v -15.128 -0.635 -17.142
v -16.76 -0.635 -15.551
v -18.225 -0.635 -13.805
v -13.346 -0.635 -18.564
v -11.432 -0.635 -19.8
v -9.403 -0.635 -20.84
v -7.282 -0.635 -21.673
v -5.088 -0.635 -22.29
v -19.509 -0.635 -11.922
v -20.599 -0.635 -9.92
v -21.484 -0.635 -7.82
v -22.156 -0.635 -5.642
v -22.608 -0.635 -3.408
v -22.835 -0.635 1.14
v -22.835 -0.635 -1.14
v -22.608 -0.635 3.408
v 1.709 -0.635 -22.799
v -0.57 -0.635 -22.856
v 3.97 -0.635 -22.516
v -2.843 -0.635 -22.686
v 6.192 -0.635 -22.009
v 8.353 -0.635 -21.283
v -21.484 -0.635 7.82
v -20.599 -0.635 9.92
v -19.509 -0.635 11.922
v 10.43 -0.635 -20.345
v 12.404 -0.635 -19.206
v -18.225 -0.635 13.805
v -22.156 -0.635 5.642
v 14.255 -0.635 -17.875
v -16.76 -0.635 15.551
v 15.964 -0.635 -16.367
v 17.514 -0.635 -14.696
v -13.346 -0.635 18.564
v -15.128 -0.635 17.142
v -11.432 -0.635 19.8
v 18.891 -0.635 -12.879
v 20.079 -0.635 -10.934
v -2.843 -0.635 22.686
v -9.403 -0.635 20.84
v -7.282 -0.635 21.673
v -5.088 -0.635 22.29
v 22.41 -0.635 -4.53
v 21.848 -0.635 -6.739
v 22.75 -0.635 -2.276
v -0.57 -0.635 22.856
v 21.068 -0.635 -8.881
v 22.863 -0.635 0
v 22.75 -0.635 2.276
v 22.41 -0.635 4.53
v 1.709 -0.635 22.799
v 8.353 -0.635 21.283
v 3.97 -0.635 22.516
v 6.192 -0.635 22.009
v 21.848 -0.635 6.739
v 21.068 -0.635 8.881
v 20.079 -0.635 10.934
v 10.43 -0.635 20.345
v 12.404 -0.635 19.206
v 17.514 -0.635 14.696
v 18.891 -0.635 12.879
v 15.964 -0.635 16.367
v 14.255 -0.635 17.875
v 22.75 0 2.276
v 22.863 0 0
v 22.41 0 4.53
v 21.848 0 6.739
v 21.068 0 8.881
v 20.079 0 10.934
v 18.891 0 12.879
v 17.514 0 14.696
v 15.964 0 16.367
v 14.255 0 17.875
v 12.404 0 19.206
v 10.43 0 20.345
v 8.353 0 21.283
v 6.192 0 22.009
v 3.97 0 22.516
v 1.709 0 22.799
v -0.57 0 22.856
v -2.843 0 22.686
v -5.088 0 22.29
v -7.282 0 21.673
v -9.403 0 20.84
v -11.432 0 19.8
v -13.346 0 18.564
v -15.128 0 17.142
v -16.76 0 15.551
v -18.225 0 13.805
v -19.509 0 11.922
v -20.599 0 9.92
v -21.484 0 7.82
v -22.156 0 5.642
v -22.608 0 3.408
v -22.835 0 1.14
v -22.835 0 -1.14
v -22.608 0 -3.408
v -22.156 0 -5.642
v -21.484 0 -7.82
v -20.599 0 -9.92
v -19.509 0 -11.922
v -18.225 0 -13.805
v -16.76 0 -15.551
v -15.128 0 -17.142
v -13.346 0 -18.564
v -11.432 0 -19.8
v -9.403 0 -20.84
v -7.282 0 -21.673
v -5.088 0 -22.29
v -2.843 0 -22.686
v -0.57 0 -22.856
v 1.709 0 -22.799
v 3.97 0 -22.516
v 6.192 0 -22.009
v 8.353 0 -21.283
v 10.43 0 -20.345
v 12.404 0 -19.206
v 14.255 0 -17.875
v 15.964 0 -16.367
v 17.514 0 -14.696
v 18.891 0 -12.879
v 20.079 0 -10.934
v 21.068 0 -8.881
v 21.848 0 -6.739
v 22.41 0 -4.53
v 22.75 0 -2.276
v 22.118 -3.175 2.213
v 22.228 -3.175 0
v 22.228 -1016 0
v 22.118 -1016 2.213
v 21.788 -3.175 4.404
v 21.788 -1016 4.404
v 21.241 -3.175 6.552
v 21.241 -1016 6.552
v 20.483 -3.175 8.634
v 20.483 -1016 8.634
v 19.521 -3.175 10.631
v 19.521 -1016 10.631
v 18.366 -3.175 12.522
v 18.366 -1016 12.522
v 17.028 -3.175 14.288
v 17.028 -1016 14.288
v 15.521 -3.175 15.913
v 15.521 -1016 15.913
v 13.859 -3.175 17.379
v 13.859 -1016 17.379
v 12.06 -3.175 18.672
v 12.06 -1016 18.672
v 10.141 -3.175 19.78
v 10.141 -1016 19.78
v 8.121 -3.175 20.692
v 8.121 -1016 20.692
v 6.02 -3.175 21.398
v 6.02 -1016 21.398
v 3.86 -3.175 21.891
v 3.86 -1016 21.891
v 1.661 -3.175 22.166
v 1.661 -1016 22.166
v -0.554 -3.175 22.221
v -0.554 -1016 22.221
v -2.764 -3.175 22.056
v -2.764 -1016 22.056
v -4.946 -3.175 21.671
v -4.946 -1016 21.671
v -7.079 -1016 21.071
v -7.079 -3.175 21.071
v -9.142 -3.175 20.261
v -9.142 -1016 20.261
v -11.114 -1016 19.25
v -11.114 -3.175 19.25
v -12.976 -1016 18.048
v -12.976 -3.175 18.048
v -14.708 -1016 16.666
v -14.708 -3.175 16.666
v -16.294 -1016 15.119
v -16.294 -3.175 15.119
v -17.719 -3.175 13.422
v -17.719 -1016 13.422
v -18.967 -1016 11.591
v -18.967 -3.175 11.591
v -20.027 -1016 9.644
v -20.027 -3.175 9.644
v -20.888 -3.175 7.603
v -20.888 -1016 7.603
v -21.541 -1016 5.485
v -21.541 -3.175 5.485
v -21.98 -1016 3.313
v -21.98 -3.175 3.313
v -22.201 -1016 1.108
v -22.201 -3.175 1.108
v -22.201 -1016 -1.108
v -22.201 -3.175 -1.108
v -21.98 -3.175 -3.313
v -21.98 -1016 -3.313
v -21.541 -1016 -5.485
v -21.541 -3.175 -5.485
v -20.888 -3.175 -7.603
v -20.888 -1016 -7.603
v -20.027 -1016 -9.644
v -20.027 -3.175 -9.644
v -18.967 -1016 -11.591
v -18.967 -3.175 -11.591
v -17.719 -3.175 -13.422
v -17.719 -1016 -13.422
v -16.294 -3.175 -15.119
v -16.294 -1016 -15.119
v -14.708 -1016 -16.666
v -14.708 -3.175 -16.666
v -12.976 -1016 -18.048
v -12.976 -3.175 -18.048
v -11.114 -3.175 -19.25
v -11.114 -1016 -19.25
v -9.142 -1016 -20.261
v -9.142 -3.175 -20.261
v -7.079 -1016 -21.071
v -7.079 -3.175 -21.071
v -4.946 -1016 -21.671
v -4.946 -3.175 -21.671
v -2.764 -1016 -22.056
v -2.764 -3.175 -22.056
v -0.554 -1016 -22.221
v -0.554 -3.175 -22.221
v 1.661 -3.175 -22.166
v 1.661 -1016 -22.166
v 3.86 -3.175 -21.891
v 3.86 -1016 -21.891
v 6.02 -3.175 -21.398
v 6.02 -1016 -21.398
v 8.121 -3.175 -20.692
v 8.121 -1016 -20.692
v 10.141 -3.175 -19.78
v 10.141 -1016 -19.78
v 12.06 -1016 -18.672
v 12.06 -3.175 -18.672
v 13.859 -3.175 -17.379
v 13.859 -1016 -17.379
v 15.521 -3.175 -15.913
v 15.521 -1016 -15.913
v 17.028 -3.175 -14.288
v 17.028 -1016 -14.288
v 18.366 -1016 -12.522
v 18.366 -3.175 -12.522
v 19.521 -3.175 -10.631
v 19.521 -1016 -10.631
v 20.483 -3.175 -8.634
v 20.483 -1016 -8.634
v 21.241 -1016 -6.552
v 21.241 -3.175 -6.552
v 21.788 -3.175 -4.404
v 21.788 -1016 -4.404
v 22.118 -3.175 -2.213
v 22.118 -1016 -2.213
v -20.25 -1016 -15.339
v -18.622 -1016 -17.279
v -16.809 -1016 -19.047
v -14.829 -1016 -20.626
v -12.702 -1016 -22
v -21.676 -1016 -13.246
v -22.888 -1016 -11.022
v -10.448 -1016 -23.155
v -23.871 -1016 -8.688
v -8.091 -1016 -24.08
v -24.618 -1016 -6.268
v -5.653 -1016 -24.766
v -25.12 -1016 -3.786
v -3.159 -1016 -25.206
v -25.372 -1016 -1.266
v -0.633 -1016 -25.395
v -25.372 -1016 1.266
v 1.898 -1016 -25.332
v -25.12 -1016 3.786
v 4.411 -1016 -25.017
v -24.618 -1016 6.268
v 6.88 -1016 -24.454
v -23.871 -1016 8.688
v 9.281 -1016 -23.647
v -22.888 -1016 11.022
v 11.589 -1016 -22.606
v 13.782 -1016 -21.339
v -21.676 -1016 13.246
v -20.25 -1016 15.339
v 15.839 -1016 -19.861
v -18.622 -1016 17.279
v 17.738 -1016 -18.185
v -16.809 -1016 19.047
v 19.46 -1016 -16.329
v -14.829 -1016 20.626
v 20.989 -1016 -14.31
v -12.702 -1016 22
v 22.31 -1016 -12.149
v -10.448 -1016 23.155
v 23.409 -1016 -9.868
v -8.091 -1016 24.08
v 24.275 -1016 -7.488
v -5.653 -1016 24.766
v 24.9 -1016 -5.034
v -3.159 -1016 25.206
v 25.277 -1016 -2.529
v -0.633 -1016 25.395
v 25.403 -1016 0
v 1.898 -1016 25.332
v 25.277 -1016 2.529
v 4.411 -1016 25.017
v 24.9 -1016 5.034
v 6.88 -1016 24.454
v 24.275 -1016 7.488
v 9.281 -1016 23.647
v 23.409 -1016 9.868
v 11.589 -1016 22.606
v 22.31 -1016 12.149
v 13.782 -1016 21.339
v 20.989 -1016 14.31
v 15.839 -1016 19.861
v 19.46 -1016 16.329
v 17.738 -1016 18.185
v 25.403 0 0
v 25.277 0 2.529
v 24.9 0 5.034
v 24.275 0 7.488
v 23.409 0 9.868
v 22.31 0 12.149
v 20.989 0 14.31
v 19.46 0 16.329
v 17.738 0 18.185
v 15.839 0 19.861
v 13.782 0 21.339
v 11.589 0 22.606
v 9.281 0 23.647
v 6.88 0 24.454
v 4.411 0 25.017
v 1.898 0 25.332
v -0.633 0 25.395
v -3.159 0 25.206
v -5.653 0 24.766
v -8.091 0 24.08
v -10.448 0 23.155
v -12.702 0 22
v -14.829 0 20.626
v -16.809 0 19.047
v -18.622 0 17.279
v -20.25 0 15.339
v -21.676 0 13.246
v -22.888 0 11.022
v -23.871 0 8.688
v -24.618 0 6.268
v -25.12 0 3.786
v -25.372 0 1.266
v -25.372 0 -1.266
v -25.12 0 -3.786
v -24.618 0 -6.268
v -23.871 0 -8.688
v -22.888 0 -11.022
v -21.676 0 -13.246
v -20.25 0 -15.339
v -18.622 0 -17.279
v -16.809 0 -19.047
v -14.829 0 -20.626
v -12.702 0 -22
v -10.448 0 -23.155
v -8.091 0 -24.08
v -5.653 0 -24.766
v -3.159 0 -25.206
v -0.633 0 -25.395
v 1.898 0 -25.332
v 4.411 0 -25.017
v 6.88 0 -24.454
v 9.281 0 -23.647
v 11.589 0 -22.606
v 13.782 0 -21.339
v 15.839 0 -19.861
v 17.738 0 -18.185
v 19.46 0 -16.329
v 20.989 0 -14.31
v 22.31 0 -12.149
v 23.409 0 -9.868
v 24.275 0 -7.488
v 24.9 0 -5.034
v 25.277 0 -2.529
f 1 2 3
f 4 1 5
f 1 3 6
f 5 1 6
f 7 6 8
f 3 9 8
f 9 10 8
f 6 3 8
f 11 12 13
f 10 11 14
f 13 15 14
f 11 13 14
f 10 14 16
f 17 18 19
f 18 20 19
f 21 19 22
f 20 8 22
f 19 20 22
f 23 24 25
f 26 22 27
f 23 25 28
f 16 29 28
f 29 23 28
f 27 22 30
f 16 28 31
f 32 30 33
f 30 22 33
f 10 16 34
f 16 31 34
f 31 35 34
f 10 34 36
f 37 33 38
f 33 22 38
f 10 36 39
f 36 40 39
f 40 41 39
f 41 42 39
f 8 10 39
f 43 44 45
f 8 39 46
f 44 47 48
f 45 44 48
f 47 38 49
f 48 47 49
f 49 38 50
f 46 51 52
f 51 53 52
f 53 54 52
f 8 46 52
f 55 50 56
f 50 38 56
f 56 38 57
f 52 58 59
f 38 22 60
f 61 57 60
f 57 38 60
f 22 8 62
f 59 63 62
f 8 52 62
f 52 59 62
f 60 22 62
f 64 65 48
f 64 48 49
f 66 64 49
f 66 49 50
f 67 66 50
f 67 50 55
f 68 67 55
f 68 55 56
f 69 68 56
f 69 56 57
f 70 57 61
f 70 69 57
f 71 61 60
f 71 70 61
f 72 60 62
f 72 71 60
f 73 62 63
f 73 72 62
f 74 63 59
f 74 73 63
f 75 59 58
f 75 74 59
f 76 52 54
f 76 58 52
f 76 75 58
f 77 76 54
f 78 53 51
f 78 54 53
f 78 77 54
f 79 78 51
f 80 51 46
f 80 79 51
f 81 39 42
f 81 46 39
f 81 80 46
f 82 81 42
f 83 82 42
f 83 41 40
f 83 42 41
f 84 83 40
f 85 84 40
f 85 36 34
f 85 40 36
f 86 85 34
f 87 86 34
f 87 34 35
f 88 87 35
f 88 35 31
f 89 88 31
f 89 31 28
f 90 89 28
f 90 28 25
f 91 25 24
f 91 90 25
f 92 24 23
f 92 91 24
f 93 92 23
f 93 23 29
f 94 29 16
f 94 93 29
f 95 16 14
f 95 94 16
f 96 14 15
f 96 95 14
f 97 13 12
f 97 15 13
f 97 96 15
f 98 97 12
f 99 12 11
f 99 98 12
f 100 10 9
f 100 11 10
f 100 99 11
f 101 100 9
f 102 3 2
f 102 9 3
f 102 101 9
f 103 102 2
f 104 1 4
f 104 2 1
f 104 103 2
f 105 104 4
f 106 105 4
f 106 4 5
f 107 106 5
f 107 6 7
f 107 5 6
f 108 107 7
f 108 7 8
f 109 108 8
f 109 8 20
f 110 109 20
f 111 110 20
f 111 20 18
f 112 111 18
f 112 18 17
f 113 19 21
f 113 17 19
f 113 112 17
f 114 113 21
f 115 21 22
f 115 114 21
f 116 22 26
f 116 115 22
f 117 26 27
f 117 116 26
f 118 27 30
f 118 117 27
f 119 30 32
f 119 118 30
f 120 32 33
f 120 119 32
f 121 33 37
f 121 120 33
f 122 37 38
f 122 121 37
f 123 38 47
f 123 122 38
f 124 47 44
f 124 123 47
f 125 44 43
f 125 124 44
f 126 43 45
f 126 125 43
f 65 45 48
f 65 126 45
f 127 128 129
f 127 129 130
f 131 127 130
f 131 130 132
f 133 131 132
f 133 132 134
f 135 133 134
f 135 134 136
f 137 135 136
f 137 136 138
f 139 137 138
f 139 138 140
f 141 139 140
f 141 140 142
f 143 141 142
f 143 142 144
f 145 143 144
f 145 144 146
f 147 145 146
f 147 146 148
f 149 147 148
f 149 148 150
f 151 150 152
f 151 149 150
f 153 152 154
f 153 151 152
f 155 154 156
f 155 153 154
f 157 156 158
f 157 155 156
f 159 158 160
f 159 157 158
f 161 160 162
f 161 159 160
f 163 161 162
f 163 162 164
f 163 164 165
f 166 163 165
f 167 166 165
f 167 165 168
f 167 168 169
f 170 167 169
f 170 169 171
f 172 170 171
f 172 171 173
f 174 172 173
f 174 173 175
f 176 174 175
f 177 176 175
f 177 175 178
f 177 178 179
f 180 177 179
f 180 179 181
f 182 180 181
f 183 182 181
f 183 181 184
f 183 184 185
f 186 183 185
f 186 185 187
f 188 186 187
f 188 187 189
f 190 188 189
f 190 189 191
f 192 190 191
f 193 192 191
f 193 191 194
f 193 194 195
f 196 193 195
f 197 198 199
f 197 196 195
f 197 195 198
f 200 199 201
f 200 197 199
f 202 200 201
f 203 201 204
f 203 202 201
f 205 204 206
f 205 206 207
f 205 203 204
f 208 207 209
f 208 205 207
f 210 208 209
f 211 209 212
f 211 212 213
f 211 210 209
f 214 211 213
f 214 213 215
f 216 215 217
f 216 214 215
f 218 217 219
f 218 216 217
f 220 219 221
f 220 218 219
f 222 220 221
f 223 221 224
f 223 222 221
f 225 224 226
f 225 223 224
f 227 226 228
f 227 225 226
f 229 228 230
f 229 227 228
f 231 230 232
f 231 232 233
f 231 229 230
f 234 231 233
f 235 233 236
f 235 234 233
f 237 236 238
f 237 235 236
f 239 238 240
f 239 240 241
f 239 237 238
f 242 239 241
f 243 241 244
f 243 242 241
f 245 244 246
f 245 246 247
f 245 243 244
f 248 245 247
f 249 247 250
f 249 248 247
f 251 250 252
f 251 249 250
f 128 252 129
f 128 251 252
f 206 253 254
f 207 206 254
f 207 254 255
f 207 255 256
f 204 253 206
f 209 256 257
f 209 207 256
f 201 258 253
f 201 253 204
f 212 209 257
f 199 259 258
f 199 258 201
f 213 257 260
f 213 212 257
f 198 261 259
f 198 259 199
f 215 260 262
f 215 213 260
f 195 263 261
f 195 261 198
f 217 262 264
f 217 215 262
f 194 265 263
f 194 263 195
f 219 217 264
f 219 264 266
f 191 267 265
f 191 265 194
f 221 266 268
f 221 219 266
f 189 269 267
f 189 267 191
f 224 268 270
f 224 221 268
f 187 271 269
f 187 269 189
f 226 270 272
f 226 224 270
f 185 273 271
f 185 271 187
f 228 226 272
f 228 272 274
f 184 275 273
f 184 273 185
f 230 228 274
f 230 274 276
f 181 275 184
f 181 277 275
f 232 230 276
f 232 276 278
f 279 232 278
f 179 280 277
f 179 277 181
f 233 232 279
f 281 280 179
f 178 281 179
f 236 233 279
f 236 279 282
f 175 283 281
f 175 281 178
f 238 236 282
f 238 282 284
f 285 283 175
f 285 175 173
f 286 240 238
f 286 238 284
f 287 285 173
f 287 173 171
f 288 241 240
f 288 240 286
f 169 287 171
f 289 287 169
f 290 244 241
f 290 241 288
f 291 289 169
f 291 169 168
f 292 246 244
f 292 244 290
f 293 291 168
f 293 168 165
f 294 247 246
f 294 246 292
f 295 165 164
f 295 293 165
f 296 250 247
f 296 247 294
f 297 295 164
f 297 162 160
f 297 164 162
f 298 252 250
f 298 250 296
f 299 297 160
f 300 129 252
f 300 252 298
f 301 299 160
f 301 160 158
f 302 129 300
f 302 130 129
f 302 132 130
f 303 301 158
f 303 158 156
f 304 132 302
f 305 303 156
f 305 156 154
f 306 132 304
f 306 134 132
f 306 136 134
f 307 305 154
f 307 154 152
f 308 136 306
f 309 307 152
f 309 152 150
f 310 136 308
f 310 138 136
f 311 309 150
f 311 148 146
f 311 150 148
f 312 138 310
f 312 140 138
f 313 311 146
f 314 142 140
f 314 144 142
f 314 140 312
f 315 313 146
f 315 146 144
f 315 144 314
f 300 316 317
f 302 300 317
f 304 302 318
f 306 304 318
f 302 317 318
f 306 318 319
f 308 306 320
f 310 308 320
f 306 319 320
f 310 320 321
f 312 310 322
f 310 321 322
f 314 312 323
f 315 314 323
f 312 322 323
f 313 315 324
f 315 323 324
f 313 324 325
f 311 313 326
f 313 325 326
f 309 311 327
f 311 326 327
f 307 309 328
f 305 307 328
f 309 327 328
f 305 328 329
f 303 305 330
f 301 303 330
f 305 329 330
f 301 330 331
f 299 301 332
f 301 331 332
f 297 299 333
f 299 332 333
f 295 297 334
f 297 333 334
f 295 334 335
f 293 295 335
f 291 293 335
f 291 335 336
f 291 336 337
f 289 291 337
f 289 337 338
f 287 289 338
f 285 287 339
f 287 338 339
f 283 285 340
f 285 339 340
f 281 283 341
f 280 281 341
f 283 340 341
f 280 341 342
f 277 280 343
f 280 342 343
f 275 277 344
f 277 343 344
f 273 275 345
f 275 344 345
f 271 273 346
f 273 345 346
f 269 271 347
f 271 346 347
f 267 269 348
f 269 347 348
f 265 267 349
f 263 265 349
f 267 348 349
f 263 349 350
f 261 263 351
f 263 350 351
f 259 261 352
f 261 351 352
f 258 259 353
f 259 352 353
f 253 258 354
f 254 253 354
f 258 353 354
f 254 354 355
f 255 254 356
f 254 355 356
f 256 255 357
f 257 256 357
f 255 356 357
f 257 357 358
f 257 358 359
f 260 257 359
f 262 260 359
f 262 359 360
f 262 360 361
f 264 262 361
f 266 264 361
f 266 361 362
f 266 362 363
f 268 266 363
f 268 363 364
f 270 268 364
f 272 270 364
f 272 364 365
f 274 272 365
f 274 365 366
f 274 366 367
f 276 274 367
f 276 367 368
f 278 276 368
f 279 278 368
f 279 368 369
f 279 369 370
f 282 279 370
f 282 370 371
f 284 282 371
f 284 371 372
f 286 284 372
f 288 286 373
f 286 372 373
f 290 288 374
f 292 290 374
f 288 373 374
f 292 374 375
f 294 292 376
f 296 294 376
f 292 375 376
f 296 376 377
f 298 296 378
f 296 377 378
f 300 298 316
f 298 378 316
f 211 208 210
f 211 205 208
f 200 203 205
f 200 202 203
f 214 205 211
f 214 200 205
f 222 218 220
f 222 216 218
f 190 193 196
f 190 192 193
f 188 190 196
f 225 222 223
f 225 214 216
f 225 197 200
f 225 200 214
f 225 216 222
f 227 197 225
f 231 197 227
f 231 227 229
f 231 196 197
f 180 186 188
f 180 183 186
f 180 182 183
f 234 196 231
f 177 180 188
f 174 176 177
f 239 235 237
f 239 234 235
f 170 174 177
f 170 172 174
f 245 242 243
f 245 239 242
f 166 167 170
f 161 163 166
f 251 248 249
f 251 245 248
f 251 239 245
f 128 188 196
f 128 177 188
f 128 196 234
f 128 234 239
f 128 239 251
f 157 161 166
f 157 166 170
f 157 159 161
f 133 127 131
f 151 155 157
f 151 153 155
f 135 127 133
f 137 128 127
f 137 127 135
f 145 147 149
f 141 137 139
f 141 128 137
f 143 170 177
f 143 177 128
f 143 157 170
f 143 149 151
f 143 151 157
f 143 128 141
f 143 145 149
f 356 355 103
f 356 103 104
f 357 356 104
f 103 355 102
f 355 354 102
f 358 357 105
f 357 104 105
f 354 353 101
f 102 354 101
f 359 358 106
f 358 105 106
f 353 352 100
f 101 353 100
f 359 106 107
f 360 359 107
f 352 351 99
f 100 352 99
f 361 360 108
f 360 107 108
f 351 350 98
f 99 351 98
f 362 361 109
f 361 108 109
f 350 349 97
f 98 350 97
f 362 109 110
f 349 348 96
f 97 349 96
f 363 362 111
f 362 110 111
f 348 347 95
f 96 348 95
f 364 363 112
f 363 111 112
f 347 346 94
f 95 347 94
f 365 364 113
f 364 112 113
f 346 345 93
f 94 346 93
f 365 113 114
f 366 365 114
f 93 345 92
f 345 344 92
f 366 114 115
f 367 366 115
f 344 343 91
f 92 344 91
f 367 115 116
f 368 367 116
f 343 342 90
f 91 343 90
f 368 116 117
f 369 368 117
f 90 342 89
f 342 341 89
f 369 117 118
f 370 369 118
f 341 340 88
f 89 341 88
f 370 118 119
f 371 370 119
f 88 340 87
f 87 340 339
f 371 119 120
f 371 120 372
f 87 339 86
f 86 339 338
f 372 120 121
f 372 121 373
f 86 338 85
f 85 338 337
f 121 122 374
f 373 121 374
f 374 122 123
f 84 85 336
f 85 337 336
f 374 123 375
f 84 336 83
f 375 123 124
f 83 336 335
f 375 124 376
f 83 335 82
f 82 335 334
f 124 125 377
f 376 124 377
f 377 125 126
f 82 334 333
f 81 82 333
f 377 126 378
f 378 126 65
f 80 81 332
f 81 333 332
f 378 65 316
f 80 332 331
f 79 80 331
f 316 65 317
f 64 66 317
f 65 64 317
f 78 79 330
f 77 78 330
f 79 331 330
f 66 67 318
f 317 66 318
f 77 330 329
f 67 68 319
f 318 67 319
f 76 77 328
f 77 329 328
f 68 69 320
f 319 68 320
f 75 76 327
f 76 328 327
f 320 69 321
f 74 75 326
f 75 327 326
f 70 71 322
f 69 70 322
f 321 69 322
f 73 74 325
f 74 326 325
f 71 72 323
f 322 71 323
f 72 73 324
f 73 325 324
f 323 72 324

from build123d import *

# Parameters (mm, degrees)
F0_R     = 25.4032998263
F1_DEPTH = 1016
F2_T     = -3.175
F3_T     = -2.54


with BuildPart() as f1:
    # F0 (on Front) → F1 (new body)
    with BuildSketch(Plane.XZ):
        Circle(F0_R)
    extrude(amount=F1_DEPTH)

    # F2
    f2_openings = [f1.faces().sort_by_distance(p)[0] for p in [
        (0, -1016, 0),
    ]]
    offset(amount=F2_T, openings=f2_openings)

    # F3
    f3_openings = [f1.faces().sort_by_distance(p)[0] for p in [
        (0, 0, 0),
    ]]
    offset(amount=F3_T, openings=f3_openings, kind=Kind.INTERSECTION)


solid = f1.part
